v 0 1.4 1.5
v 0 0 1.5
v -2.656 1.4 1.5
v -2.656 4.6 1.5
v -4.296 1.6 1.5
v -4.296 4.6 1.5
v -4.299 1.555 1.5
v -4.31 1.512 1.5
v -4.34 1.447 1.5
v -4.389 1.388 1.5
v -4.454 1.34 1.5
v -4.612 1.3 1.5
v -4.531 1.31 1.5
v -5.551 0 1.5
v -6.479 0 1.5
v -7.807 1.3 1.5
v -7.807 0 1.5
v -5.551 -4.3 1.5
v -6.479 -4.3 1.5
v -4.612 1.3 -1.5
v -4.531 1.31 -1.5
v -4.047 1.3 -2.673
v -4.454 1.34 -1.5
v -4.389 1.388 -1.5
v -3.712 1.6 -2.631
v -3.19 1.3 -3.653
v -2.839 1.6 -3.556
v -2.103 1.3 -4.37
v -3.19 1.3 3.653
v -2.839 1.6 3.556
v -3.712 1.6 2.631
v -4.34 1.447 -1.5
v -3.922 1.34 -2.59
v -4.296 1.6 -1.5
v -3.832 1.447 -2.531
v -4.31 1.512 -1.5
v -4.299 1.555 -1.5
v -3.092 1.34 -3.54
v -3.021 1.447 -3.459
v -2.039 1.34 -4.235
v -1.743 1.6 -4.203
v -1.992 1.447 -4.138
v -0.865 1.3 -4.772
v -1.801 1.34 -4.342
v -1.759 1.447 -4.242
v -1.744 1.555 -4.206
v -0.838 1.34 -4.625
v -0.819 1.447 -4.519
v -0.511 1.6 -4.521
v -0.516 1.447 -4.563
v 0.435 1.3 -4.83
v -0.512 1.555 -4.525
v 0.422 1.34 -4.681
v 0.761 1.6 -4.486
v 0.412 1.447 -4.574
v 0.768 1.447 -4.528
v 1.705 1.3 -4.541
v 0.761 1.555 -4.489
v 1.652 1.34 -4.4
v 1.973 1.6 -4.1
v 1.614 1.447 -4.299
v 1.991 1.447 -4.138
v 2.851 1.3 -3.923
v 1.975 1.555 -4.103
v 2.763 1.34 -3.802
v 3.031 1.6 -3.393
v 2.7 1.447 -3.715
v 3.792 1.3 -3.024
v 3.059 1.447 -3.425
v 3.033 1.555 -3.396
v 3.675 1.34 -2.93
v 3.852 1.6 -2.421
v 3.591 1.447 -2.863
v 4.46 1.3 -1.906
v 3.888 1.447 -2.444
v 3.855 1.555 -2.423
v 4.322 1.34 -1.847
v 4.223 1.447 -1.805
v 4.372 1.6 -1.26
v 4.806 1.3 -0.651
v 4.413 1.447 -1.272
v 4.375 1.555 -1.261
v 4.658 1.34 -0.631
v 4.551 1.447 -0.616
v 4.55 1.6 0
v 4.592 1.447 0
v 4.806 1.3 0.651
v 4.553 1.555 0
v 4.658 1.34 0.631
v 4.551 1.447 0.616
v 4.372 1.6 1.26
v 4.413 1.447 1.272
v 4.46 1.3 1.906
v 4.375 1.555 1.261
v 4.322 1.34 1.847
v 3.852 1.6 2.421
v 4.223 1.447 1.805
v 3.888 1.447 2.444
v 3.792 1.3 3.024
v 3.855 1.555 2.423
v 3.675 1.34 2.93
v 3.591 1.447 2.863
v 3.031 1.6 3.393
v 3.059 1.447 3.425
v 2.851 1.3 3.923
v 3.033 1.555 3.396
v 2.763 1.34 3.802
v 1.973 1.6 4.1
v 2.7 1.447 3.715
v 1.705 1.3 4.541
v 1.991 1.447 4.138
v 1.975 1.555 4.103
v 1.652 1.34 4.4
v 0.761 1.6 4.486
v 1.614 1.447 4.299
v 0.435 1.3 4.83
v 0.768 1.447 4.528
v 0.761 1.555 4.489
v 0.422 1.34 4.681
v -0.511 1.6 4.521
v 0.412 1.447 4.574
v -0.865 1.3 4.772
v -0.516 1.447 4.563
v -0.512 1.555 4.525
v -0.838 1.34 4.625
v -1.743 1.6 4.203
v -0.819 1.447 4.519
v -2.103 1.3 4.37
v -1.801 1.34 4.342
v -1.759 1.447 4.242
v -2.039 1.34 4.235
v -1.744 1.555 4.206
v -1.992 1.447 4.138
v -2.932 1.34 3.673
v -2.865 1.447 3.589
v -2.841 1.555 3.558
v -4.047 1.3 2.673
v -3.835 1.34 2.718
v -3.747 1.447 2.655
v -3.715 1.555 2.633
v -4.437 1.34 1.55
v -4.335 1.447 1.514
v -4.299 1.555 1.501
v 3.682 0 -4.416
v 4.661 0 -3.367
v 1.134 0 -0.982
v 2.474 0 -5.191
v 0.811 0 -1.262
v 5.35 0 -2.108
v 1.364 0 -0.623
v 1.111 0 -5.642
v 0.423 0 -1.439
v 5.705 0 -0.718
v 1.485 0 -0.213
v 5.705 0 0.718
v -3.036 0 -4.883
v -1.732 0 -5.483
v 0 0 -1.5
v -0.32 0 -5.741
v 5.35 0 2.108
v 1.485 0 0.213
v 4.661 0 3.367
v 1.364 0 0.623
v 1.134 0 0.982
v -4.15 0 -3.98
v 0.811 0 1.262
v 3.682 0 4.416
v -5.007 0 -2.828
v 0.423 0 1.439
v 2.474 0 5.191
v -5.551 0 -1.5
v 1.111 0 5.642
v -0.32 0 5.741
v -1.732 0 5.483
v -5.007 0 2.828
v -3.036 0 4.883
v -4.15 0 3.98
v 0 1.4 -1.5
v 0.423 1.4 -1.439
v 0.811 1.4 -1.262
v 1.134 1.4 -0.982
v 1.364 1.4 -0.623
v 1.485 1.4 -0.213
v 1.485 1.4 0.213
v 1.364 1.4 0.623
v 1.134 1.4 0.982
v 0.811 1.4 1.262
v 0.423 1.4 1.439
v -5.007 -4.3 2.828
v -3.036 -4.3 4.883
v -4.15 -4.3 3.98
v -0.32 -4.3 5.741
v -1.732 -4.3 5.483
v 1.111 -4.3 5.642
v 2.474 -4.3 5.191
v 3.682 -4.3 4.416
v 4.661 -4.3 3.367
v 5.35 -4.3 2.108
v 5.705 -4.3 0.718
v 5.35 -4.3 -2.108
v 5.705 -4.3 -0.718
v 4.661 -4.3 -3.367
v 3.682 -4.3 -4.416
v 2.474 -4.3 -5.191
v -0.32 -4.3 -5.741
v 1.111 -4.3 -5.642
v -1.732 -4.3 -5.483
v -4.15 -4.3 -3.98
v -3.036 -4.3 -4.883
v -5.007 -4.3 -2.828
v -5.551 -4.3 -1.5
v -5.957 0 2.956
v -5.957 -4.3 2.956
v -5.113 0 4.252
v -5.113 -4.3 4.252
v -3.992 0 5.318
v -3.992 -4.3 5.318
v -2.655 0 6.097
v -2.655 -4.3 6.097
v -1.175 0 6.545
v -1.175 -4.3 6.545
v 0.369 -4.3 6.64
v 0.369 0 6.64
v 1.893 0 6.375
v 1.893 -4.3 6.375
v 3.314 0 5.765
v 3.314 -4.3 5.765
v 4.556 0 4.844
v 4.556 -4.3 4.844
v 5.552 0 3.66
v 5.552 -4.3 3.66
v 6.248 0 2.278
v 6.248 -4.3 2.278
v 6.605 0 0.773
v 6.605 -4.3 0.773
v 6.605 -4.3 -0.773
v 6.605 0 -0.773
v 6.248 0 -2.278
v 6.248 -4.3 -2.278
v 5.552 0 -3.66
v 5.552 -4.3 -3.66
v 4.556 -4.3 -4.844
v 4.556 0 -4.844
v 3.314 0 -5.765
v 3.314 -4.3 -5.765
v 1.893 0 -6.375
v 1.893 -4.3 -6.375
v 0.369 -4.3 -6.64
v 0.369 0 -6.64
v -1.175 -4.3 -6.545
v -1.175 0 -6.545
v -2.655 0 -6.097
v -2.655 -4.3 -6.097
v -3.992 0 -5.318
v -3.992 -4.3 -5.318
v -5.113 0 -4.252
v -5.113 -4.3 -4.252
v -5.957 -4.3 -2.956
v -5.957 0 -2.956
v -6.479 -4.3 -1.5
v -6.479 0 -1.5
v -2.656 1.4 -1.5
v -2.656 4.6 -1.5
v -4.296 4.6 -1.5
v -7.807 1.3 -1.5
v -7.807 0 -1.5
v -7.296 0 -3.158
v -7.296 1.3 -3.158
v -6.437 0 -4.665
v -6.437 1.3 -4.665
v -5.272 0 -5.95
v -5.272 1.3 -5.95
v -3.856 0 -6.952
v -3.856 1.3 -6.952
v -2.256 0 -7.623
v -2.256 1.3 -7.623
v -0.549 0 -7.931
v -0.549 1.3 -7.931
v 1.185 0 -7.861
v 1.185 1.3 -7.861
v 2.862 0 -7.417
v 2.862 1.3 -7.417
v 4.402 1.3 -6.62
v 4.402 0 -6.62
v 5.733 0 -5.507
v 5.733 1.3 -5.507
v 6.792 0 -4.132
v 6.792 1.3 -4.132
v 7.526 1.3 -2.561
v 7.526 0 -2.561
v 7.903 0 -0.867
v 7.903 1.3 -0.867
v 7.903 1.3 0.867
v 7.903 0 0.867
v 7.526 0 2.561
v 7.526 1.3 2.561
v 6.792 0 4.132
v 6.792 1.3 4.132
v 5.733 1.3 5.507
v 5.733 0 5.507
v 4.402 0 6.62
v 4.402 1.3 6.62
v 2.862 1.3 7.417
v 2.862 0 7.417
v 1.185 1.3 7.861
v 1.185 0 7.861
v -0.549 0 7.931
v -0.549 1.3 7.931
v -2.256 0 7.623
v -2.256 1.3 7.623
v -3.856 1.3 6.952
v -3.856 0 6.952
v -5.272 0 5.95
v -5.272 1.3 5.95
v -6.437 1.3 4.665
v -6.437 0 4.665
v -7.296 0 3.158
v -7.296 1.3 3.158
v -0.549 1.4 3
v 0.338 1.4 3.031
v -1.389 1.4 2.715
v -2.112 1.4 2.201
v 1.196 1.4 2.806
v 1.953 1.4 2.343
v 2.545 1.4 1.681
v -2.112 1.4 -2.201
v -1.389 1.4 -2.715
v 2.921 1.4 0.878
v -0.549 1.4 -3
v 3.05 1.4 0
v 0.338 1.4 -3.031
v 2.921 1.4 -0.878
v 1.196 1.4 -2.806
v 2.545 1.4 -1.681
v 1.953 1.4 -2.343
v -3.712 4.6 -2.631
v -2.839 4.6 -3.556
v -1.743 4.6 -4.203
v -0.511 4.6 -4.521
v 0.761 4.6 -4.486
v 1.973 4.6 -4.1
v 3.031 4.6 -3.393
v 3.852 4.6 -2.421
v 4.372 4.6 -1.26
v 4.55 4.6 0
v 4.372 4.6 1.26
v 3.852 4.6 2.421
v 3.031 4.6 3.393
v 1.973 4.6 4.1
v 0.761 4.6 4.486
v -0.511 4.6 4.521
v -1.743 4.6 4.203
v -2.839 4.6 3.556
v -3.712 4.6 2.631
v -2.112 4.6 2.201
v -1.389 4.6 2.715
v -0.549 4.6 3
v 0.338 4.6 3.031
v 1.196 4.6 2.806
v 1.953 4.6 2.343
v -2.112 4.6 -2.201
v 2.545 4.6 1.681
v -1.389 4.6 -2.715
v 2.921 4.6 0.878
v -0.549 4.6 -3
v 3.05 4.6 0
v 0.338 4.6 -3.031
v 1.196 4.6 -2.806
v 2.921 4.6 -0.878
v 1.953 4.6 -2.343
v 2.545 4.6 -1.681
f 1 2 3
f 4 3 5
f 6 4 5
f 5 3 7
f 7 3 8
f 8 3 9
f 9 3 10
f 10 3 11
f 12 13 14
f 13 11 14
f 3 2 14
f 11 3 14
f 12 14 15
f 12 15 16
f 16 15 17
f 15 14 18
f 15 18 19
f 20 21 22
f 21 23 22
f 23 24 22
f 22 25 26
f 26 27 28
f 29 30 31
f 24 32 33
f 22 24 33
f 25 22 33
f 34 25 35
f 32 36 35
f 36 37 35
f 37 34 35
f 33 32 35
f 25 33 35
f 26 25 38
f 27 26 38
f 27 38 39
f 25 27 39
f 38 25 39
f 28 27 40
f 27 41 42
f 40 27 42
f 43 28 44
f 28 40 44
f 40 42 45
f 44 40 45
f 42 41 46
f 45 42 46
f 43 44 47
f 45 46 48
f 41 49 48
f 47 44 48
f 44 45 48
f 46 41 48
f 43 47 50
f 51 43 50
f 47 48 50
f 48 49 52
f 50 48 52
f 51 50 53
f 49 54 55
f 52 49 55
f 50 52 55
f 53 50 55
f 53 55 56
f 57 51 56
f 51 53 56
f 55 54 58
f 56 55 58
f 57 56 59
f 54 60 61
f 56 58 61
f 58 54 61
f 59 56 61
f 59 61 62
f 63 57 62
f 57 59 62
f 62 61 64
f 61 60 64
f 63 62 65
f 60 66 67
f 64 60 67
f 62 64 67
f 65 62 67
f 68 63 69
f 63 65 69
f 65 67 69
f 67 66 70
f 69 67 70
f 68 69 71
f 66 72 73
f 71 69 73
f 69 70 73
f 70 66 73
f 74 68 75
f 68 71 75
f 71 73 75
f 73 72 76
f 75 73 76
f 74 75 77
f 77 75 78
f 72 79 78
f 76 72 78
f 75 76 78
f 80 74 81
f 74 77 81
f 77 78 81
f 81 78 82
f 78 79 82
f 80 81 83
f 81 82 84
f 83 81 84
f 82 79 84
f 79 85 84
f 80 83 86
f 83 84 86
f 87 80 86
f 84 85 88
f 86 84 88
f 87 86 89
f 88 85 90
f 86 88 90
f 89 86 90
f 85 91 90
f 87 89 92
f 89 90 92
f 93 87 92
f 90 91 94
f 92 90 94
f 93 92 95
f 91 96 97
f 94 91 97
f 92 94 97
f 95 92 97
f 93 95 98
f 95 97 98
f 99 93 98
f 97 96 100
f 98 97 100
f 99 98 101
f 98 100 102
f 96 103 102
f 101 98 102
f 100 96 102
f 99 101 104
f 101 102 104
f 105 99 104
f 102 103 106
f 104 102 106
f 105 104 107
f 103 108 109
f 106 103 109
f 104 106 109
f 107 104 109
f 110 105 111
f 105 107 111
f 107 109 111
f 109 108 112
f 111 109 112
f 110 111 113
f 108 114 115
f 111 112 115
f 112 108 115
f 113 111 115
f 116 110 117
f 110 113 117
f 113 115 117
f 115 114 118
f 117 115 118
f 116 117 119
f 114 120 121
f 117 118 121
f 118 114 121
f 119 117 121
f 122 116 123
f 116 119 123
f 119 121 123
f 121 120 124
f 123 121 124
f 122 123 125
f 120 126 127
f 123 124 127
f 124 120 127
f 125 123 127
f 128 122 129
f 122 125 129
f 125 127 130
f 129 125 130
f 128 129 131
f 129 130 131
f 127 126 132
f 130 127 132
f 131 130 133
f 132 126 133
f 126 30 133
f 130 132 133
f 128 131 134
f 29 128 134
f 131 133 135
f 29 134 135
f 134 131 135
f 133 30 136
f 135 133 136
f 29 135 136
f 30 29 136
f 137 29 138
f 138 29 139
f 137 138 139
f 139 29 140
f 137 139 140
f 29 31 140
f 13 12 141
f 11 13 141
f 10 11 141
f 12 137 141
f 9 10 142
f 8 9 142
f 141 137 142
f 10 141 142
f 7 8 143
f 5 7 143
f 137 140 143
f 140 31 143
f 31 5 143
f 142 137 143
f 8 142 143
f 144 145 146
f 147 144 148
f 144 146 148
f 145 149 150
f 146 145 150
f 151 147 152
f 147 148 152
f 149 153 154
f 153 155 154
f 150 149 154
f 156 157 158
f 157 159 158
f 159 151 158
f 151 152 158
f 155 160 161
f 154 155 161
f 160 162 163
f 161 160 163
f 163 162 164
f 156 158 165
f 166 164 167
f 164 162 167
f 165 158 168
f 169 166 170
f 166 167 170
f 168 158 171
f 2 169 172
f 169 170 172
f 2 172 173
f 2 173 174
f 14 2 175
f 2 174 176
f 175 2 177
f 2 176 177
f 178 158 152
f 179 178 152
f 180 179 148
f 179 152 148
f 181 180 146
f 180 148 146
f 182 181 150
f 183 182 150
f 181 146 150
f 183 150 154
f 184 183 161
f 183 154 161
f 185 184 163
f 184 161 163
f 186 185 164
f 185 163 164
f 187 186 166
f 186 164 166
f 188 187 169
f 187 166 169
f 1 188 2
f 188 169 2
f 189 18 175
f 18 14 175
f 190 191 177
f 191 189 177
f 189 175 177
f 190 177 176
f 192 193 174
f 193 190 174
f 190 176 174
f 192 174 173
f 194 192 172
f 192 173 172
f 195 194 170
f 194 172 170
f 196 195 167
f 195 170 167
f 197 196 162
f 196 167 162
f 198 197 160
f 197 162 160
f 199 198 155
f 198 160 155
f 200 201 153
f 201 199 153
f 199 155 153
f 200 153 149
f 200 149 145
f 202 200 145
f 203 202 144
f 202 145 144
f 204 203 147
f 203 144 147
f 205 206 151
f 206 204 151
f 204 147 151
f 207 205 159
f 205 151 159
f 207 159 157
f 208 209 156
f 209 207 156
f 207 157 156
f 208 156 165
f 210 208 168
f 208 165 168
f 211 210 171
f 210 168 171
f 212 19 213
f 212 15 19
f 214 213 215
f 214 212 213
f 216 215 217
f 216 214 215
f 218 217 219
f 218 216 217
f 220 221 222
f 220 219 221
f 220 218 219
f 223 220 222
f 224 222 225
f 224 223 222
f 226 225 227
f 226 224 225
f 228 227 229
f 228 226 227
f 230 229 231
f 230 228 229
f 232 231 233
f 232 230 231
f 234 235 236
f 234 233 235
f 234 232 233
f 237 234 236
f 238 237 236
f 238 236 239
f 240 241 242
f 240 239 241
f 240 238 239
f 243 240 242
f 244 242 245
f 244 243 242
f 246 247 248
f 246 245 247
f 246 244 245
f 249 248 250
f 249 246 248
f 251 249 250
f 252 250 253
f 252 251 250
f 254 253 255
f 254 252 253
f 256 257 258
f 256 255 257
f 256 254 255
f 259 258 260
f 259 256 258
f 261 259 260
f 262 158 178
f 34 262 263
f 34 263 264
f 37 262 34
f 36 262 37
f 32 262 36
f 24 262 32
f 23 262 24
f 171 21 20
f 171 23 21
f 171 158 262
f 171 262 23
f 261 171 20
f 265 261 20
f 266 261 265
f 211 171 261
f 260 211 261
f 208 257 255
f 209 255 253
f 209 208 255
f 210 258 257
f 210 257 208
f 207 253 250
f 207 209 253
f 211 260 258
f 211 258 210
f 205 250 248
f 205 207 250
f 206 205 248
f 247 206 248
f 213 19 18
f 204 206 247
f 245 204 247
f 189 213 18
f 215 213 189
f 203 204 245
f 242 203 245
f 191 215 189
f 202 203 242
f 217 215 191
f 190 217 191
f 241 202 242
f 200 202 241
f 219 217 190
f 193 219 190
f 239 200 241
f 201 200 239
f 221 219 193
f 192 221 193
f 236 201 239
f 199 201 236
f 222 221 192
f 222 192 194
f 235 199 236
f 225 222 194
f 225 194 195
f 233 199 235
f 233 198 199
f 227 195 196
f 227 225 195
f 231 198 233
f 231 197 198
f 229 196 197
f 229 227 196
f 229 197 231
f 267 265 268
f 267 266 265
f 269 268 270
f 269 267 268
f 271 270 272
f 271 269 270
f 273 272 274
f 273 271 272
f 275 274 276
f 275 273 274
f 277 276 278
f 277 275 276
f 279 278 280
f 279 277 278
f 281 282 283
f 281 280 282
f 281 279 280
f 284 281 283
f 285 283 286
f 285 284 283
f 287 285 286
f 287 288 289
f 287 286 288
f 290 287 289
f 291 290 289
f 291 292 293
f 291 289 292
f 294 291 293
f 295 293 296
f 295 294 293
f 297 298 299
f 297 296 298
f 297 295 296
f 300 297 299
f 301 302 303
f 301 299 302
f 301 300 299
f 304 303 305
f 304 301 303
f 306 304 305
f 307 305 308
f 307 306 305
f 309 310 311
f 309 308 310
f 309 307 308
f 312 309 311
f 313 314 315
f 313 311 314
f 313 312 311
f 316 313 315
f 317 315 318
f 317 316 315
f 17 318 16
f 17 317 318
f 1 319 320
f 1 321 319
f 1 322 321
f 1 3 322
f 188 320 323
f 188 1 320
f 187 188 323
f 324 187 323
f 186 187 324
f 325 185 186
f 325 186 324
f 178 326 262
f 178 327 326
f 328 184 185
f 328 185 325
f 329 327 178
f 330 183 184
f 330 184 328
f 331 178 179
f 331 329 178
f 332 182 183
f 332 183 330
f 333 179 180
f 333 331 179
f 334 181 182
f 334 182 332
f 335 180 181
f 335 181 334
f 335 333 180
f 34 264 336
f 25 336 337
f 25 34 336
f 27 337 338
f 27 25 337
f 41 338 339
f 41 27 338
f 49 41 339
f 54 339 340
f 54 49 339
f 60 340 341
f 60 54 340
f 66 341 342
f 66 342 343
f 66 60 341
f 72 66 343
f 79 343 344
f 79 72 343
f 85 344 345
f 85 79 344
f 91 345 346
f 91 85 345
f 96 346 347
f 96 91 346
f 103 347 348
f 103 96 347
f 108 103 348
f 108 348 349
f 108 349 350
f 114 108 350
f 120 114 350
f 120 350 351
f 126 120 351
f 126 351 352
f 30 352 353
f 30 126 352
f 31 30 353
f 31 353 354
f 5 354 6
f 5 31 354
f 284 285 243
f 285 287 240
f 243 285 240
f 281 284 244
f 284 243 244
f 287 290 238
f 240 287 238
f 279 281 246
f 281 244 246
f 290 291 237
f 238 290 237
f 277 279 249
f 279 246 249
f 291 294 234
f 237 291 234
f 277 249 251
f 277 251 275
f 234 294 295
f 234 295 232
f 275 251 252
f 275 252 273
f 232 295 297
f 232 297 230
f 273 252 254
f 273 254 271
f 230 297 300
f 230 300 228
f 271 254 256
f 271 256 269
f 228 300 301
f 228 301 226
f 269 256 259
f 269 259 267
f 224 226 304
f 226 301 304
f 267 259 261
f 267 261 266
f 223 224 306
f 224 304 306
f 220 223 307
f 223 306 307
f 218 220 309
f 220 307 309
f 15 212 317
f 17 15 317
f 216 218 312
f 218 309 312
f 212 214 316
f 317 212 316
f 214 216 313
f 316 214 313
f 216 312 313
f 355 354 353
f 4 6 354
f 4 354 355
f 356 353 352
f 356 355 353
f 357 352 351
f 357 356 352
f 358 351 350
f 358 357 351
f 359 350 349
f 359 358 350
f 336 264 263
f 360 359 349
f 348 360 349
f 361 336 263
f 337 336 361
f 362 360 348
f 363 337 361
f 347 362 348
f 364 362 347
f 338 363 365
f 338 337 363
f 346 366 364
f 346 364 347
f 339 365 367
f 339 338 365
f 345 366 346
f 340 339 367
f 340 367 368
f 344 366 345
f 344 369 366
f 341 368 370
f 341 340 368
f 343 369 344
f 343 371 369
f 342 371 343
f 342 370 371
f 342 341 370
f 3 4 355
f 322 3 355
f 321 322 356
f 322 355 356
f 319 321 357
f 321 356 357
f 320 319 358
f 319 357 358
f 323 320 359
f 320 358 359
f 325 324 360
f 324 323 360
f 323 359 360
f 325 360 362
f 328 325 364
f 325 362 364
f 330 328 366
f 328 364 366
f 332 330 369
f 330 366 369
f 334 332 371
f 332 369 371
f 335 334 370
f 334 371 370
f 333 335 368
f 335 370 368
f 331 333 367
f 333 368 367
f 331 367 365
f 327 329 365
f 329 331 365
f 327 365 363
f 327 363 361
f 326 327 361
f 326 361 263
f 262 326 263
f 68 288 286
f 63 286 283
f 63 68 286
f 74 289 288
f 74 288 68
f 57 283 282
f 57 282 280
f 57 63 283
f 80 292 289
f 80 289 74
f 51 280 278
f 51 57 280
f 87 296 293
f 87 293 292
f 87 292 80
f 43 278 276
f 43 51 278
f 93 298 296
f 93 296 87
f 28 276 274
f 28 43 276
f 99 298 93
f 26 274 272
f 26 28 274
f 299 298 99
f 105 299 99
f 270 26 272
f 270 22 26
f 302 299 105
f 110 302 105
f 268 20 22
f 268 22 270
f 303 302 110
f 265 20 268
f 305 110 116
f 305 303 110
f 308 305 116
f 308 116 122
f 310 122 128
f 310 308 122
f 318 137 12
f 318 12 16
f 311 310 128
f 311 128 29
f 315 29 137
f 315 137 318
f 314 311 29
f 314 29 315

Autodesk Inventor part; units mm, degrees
ref_plane "YZ Plane" through (0, 0, 0) normal (1, 0, 0) x (0, 1, 0)
ref_plane "XZ Plane" through (0, 0, 0) normal (0, 1, 0) x (-1, 0, 0)
ref_plane "XY Plane" through (0, 0, 0) normal (0, 0, 1) x (1, 0, 0)
sketch "Boceto1" plane through (0, 0, 0) normal (0, 1, 0) x (-1, 0, 0)
  circle A0 centre (0, 0) radius 7.95
  dimension "d0" = 15.9
extrude "Extrusión1" add sketch "Boceto1" along normal blind 1.3
sketch "Boceto2" plane through (0, 1.3, 0) normal (0, 1, 0) x (1, 0, 0)
  circle A0 centre (0, 0) radius 4.55
  dimension "d3" = 9.1
extrude "Extrusión2" add sketch "Boceto2" along normal blind 3.3
sketch "Boceto3" plane through (0, 4.6, 0) normal (0, 1, 0) x (1, 0, 0)
  circle A0 centre (0, 0) radius 3.05
  dimension "d6" = 6.1
extrude "Extrusión3" cut sketch "Boceto3" against normal blind 3.2
sketch "Boceto4" plane through (0, 1.4, 0) normal (0, 1, 0) x (1, 0, 0)
  arc A0 (0, -1.5) -> (0, 1.5) centre (0, 0) ccw
  line L0 (0, -1.5) -> (-7.8072, -1.5)
  circle A1 centre (0, 0) radius 7.95 projected
  line L1 (0, 1.5) -> (-7.8072, 1.5)
  arc A2 (-7.8072, 1.5) -> (-7.8072, -1.5) centre (0, 0) ccw
  dimension "d9" = 3
extrude "Extrusión4" cut sketch "Boceto4" along normal blind 3.2 and the other way blind 1.6 contours L0 A1 L1 A0 picked at (-2.6447, -0.1676)
fillet "Empalme1" radius 0.3 1 edges at (4.55, 1.3, 0)
sketch "Boceto5" plane through (0, 0, 0) normal (0, -1, 0) x (1, 0, 0)
  arc A0 (-6.4786, -1.5) -> (-6.4786, 1.5) centre (0, 0) ccw
  arc A1 (-5.5509, -1.5) -> (-5.5509, 1.5) centre (0, 0) ccw
  line L0 (-7.8072, 1.5) -> (0, 1.5) projected
  line L1 (-5.5509, 1.5) -> (-6.4786, 1.5)
  line L2 (-7.8072, -1.5) -> (-4.6122, -1.5) projected
  line L3 (-6.4786, -1.5) -> (-5.5509, -1.5)
  dimension "d15" = 13.3
  dimension "d16" = 11.5
extrude "Extrusión5" add sketch "Boceto5" along normal blind 4.3
properties part number "Pieza_Presion_resorte" material "Plástico ABS"
